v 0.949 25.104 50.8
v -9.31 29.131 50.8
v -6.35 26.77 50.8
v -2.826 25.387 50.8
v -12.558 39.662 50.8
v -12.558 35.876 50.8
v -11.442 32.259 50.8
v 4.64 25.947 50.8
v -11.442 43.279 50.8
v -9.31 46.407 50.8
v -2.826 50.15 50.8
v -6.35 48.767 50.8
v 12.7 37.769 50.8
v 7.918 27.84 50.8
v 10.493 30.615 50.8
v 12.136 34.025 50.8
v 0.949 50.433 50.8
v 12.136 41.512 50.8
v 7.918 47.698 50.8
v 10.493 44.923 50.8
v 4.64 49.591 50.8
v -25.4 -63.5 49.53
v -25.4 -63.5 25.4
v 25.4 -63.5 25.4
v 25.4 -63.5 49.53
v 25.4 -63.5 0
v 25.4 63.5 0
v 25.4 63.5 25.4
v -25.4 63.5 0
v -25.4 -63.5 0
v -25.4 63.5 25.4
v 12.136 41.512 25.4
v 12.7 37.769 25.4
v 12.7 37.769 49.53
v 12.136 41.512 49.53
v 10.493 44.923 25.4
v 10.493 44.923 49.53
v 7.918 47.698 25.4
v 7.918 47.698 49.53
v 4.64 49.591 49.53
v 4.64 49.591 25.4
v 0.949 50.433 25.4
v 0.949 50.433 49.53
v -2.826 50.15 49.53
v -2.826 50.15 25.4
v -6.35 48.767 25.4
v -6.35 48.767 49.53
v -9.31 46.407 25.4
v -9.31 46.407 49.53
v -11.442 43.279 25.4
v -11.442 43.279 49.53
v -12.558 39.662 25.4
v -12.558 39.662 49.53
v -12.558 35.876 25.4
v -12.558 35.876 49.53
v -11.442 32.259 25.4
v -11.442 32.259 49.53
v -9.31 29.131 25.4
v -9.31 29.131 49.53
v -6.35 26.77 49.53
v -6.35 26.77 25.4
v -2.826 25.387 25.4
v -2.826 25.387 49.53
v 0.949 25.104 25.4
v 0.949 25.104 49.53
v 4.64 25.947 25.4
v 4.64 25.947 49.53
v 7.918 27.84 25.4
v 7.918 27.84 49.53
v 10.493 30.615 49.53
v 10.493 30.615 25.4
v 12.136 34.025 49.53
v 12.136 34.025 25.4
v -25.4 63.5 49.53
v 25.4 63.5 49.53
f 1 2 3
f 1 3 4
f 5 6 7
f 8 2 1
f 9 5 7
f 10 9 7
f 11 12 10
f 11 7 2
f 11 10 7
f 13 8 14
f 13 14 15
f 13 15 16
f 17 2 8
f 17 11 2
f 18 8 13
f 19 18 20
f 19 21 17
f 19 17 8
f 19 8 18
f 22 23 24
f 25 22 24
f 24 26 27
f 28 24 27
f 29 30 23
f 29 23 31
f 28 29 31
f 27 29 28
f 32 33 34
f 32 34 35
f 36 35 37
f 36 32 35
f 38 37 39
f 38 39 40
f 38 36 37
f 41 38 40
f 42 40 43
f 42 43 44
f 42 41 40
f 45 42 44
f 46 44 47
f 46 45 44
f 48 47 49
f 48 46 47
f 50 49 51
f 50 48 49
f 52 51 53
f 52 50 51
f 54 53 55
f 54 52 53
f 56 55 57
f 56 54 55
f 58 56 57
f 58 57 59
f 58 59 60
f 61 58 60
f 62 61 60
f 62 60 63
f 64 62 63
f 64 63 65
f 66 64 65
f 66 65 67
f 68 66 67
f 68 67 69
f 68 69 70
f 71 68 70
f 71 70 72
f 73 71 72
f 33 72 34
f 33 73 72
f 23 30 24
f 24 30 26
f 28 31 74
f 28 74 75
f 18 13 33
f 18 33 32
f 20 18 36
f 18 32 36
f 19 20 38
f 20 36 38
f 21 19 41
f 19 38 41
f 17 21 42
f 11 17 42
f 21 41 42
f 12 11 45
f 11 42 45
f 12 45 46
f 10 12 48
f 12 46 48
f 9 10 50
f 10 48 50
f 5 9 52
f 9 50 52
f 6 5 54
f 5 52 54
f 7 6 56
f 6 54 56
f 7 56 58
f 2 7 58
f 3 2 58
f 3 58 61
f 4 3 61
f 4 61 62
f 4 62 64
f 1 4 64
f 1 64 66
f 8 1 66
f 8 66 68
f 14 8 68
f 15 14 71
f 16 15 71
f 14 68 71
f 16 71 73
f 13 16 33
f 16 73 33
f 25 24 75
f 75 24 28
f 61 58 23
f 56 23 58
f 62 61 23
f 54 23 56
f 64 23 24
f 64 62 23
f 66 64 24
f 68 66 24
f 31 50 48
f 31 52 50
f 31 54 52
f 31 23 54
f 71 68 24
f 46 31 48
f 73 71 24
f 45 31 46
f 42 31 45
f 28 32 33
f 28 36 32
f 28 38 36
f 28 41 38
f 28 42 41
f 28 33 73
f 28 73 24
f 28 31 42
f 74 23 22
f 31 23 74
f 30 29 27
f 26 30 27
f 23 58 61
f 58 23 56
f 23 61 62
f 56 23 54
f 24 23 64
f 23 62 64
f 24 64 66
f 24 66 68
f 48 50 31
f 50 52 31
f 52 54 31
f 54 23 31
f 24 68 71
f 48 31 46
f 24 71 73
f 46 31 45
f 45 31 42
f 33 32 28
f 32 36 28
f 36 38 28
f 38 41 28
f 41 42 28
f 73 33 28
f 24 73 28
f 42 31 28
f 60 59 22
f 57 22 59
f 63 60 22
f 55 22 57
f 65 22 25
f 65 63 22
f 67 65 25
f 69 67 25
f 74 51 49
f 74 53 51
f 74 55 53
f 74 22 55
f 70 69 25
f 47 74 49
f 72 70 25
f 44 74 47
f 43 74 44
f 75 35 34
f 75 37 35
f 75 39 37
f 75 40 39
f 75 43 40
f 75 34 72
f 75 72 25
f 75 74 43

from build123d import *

# Parameters (mm, degrees)
F0_W     = 50.8
F0_H     = 127
F1_DEPTH = 25.4
F2_R     = 12.7
F3_DEPTH = 25.4
F4_W     = 50.8
F4_H     = 127
F4_R     = 12.7
F5_DEPTH = 24.13


with BuildPart() as f1:
    # F0 (on Top) → F1 (new body)
    with BuildSketch(Plane.XY):
        Rectangle(F0_W, F0_H)
    extrude(amount=F1_DEPTH)

    # F2 (on face) → F3 (join)
    with BuildSketch(Plane.XY.offset(25.4)):
        with Locations((0, 37.768841)):
            Circle(F2_R)
    extrude(amount=F3_DEPTH)


with BuildPart() as f5:
    # F4 (on face) → F5 (new body)
    with BuildSketch(Plane.XY.offset(25.4)):
        Rectangle(F4_W, F4_H)
        with Locations((0, 37.768841)):
            Circle(F4_R, mode=Mode.SUBTRACT)
    extrude(amount=F5_DEPTH)


solid = Compound([f1.part, f5.part])
